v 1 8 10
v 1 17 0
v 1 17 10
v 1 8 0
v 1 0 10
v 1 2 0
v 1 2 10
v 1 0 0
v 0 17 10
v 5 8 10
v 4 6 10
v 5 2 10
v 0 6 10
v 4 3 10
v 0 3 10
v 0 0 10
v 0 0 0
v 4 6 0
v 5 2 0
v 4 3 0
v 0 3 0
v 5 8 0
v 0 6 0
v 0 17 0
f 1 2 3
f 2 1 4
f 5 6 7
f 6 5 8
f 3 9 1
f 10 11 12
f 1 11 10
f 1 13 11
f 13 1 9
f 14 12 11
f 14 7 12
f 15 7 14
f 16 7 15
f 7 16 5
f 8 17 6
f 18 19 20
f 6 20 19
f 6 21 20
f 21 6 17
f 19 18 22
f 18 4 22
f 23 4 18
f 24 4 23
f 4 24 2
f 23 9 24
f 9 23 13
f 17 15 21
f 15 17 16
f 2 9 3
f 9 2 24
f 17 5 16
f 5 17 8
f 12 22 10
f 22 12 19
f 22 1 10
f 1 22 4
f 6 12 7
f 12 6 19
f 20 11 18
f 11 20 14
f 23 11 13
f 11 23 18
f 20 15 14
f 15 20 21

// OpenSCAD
$fn=30;

difference(){
	union(){
		cube([1,17,10]);
		translate([0,2,0]) cube([5,6,10]);
	}

	translate([0,3,0]) cube([4,3,10]);
}
